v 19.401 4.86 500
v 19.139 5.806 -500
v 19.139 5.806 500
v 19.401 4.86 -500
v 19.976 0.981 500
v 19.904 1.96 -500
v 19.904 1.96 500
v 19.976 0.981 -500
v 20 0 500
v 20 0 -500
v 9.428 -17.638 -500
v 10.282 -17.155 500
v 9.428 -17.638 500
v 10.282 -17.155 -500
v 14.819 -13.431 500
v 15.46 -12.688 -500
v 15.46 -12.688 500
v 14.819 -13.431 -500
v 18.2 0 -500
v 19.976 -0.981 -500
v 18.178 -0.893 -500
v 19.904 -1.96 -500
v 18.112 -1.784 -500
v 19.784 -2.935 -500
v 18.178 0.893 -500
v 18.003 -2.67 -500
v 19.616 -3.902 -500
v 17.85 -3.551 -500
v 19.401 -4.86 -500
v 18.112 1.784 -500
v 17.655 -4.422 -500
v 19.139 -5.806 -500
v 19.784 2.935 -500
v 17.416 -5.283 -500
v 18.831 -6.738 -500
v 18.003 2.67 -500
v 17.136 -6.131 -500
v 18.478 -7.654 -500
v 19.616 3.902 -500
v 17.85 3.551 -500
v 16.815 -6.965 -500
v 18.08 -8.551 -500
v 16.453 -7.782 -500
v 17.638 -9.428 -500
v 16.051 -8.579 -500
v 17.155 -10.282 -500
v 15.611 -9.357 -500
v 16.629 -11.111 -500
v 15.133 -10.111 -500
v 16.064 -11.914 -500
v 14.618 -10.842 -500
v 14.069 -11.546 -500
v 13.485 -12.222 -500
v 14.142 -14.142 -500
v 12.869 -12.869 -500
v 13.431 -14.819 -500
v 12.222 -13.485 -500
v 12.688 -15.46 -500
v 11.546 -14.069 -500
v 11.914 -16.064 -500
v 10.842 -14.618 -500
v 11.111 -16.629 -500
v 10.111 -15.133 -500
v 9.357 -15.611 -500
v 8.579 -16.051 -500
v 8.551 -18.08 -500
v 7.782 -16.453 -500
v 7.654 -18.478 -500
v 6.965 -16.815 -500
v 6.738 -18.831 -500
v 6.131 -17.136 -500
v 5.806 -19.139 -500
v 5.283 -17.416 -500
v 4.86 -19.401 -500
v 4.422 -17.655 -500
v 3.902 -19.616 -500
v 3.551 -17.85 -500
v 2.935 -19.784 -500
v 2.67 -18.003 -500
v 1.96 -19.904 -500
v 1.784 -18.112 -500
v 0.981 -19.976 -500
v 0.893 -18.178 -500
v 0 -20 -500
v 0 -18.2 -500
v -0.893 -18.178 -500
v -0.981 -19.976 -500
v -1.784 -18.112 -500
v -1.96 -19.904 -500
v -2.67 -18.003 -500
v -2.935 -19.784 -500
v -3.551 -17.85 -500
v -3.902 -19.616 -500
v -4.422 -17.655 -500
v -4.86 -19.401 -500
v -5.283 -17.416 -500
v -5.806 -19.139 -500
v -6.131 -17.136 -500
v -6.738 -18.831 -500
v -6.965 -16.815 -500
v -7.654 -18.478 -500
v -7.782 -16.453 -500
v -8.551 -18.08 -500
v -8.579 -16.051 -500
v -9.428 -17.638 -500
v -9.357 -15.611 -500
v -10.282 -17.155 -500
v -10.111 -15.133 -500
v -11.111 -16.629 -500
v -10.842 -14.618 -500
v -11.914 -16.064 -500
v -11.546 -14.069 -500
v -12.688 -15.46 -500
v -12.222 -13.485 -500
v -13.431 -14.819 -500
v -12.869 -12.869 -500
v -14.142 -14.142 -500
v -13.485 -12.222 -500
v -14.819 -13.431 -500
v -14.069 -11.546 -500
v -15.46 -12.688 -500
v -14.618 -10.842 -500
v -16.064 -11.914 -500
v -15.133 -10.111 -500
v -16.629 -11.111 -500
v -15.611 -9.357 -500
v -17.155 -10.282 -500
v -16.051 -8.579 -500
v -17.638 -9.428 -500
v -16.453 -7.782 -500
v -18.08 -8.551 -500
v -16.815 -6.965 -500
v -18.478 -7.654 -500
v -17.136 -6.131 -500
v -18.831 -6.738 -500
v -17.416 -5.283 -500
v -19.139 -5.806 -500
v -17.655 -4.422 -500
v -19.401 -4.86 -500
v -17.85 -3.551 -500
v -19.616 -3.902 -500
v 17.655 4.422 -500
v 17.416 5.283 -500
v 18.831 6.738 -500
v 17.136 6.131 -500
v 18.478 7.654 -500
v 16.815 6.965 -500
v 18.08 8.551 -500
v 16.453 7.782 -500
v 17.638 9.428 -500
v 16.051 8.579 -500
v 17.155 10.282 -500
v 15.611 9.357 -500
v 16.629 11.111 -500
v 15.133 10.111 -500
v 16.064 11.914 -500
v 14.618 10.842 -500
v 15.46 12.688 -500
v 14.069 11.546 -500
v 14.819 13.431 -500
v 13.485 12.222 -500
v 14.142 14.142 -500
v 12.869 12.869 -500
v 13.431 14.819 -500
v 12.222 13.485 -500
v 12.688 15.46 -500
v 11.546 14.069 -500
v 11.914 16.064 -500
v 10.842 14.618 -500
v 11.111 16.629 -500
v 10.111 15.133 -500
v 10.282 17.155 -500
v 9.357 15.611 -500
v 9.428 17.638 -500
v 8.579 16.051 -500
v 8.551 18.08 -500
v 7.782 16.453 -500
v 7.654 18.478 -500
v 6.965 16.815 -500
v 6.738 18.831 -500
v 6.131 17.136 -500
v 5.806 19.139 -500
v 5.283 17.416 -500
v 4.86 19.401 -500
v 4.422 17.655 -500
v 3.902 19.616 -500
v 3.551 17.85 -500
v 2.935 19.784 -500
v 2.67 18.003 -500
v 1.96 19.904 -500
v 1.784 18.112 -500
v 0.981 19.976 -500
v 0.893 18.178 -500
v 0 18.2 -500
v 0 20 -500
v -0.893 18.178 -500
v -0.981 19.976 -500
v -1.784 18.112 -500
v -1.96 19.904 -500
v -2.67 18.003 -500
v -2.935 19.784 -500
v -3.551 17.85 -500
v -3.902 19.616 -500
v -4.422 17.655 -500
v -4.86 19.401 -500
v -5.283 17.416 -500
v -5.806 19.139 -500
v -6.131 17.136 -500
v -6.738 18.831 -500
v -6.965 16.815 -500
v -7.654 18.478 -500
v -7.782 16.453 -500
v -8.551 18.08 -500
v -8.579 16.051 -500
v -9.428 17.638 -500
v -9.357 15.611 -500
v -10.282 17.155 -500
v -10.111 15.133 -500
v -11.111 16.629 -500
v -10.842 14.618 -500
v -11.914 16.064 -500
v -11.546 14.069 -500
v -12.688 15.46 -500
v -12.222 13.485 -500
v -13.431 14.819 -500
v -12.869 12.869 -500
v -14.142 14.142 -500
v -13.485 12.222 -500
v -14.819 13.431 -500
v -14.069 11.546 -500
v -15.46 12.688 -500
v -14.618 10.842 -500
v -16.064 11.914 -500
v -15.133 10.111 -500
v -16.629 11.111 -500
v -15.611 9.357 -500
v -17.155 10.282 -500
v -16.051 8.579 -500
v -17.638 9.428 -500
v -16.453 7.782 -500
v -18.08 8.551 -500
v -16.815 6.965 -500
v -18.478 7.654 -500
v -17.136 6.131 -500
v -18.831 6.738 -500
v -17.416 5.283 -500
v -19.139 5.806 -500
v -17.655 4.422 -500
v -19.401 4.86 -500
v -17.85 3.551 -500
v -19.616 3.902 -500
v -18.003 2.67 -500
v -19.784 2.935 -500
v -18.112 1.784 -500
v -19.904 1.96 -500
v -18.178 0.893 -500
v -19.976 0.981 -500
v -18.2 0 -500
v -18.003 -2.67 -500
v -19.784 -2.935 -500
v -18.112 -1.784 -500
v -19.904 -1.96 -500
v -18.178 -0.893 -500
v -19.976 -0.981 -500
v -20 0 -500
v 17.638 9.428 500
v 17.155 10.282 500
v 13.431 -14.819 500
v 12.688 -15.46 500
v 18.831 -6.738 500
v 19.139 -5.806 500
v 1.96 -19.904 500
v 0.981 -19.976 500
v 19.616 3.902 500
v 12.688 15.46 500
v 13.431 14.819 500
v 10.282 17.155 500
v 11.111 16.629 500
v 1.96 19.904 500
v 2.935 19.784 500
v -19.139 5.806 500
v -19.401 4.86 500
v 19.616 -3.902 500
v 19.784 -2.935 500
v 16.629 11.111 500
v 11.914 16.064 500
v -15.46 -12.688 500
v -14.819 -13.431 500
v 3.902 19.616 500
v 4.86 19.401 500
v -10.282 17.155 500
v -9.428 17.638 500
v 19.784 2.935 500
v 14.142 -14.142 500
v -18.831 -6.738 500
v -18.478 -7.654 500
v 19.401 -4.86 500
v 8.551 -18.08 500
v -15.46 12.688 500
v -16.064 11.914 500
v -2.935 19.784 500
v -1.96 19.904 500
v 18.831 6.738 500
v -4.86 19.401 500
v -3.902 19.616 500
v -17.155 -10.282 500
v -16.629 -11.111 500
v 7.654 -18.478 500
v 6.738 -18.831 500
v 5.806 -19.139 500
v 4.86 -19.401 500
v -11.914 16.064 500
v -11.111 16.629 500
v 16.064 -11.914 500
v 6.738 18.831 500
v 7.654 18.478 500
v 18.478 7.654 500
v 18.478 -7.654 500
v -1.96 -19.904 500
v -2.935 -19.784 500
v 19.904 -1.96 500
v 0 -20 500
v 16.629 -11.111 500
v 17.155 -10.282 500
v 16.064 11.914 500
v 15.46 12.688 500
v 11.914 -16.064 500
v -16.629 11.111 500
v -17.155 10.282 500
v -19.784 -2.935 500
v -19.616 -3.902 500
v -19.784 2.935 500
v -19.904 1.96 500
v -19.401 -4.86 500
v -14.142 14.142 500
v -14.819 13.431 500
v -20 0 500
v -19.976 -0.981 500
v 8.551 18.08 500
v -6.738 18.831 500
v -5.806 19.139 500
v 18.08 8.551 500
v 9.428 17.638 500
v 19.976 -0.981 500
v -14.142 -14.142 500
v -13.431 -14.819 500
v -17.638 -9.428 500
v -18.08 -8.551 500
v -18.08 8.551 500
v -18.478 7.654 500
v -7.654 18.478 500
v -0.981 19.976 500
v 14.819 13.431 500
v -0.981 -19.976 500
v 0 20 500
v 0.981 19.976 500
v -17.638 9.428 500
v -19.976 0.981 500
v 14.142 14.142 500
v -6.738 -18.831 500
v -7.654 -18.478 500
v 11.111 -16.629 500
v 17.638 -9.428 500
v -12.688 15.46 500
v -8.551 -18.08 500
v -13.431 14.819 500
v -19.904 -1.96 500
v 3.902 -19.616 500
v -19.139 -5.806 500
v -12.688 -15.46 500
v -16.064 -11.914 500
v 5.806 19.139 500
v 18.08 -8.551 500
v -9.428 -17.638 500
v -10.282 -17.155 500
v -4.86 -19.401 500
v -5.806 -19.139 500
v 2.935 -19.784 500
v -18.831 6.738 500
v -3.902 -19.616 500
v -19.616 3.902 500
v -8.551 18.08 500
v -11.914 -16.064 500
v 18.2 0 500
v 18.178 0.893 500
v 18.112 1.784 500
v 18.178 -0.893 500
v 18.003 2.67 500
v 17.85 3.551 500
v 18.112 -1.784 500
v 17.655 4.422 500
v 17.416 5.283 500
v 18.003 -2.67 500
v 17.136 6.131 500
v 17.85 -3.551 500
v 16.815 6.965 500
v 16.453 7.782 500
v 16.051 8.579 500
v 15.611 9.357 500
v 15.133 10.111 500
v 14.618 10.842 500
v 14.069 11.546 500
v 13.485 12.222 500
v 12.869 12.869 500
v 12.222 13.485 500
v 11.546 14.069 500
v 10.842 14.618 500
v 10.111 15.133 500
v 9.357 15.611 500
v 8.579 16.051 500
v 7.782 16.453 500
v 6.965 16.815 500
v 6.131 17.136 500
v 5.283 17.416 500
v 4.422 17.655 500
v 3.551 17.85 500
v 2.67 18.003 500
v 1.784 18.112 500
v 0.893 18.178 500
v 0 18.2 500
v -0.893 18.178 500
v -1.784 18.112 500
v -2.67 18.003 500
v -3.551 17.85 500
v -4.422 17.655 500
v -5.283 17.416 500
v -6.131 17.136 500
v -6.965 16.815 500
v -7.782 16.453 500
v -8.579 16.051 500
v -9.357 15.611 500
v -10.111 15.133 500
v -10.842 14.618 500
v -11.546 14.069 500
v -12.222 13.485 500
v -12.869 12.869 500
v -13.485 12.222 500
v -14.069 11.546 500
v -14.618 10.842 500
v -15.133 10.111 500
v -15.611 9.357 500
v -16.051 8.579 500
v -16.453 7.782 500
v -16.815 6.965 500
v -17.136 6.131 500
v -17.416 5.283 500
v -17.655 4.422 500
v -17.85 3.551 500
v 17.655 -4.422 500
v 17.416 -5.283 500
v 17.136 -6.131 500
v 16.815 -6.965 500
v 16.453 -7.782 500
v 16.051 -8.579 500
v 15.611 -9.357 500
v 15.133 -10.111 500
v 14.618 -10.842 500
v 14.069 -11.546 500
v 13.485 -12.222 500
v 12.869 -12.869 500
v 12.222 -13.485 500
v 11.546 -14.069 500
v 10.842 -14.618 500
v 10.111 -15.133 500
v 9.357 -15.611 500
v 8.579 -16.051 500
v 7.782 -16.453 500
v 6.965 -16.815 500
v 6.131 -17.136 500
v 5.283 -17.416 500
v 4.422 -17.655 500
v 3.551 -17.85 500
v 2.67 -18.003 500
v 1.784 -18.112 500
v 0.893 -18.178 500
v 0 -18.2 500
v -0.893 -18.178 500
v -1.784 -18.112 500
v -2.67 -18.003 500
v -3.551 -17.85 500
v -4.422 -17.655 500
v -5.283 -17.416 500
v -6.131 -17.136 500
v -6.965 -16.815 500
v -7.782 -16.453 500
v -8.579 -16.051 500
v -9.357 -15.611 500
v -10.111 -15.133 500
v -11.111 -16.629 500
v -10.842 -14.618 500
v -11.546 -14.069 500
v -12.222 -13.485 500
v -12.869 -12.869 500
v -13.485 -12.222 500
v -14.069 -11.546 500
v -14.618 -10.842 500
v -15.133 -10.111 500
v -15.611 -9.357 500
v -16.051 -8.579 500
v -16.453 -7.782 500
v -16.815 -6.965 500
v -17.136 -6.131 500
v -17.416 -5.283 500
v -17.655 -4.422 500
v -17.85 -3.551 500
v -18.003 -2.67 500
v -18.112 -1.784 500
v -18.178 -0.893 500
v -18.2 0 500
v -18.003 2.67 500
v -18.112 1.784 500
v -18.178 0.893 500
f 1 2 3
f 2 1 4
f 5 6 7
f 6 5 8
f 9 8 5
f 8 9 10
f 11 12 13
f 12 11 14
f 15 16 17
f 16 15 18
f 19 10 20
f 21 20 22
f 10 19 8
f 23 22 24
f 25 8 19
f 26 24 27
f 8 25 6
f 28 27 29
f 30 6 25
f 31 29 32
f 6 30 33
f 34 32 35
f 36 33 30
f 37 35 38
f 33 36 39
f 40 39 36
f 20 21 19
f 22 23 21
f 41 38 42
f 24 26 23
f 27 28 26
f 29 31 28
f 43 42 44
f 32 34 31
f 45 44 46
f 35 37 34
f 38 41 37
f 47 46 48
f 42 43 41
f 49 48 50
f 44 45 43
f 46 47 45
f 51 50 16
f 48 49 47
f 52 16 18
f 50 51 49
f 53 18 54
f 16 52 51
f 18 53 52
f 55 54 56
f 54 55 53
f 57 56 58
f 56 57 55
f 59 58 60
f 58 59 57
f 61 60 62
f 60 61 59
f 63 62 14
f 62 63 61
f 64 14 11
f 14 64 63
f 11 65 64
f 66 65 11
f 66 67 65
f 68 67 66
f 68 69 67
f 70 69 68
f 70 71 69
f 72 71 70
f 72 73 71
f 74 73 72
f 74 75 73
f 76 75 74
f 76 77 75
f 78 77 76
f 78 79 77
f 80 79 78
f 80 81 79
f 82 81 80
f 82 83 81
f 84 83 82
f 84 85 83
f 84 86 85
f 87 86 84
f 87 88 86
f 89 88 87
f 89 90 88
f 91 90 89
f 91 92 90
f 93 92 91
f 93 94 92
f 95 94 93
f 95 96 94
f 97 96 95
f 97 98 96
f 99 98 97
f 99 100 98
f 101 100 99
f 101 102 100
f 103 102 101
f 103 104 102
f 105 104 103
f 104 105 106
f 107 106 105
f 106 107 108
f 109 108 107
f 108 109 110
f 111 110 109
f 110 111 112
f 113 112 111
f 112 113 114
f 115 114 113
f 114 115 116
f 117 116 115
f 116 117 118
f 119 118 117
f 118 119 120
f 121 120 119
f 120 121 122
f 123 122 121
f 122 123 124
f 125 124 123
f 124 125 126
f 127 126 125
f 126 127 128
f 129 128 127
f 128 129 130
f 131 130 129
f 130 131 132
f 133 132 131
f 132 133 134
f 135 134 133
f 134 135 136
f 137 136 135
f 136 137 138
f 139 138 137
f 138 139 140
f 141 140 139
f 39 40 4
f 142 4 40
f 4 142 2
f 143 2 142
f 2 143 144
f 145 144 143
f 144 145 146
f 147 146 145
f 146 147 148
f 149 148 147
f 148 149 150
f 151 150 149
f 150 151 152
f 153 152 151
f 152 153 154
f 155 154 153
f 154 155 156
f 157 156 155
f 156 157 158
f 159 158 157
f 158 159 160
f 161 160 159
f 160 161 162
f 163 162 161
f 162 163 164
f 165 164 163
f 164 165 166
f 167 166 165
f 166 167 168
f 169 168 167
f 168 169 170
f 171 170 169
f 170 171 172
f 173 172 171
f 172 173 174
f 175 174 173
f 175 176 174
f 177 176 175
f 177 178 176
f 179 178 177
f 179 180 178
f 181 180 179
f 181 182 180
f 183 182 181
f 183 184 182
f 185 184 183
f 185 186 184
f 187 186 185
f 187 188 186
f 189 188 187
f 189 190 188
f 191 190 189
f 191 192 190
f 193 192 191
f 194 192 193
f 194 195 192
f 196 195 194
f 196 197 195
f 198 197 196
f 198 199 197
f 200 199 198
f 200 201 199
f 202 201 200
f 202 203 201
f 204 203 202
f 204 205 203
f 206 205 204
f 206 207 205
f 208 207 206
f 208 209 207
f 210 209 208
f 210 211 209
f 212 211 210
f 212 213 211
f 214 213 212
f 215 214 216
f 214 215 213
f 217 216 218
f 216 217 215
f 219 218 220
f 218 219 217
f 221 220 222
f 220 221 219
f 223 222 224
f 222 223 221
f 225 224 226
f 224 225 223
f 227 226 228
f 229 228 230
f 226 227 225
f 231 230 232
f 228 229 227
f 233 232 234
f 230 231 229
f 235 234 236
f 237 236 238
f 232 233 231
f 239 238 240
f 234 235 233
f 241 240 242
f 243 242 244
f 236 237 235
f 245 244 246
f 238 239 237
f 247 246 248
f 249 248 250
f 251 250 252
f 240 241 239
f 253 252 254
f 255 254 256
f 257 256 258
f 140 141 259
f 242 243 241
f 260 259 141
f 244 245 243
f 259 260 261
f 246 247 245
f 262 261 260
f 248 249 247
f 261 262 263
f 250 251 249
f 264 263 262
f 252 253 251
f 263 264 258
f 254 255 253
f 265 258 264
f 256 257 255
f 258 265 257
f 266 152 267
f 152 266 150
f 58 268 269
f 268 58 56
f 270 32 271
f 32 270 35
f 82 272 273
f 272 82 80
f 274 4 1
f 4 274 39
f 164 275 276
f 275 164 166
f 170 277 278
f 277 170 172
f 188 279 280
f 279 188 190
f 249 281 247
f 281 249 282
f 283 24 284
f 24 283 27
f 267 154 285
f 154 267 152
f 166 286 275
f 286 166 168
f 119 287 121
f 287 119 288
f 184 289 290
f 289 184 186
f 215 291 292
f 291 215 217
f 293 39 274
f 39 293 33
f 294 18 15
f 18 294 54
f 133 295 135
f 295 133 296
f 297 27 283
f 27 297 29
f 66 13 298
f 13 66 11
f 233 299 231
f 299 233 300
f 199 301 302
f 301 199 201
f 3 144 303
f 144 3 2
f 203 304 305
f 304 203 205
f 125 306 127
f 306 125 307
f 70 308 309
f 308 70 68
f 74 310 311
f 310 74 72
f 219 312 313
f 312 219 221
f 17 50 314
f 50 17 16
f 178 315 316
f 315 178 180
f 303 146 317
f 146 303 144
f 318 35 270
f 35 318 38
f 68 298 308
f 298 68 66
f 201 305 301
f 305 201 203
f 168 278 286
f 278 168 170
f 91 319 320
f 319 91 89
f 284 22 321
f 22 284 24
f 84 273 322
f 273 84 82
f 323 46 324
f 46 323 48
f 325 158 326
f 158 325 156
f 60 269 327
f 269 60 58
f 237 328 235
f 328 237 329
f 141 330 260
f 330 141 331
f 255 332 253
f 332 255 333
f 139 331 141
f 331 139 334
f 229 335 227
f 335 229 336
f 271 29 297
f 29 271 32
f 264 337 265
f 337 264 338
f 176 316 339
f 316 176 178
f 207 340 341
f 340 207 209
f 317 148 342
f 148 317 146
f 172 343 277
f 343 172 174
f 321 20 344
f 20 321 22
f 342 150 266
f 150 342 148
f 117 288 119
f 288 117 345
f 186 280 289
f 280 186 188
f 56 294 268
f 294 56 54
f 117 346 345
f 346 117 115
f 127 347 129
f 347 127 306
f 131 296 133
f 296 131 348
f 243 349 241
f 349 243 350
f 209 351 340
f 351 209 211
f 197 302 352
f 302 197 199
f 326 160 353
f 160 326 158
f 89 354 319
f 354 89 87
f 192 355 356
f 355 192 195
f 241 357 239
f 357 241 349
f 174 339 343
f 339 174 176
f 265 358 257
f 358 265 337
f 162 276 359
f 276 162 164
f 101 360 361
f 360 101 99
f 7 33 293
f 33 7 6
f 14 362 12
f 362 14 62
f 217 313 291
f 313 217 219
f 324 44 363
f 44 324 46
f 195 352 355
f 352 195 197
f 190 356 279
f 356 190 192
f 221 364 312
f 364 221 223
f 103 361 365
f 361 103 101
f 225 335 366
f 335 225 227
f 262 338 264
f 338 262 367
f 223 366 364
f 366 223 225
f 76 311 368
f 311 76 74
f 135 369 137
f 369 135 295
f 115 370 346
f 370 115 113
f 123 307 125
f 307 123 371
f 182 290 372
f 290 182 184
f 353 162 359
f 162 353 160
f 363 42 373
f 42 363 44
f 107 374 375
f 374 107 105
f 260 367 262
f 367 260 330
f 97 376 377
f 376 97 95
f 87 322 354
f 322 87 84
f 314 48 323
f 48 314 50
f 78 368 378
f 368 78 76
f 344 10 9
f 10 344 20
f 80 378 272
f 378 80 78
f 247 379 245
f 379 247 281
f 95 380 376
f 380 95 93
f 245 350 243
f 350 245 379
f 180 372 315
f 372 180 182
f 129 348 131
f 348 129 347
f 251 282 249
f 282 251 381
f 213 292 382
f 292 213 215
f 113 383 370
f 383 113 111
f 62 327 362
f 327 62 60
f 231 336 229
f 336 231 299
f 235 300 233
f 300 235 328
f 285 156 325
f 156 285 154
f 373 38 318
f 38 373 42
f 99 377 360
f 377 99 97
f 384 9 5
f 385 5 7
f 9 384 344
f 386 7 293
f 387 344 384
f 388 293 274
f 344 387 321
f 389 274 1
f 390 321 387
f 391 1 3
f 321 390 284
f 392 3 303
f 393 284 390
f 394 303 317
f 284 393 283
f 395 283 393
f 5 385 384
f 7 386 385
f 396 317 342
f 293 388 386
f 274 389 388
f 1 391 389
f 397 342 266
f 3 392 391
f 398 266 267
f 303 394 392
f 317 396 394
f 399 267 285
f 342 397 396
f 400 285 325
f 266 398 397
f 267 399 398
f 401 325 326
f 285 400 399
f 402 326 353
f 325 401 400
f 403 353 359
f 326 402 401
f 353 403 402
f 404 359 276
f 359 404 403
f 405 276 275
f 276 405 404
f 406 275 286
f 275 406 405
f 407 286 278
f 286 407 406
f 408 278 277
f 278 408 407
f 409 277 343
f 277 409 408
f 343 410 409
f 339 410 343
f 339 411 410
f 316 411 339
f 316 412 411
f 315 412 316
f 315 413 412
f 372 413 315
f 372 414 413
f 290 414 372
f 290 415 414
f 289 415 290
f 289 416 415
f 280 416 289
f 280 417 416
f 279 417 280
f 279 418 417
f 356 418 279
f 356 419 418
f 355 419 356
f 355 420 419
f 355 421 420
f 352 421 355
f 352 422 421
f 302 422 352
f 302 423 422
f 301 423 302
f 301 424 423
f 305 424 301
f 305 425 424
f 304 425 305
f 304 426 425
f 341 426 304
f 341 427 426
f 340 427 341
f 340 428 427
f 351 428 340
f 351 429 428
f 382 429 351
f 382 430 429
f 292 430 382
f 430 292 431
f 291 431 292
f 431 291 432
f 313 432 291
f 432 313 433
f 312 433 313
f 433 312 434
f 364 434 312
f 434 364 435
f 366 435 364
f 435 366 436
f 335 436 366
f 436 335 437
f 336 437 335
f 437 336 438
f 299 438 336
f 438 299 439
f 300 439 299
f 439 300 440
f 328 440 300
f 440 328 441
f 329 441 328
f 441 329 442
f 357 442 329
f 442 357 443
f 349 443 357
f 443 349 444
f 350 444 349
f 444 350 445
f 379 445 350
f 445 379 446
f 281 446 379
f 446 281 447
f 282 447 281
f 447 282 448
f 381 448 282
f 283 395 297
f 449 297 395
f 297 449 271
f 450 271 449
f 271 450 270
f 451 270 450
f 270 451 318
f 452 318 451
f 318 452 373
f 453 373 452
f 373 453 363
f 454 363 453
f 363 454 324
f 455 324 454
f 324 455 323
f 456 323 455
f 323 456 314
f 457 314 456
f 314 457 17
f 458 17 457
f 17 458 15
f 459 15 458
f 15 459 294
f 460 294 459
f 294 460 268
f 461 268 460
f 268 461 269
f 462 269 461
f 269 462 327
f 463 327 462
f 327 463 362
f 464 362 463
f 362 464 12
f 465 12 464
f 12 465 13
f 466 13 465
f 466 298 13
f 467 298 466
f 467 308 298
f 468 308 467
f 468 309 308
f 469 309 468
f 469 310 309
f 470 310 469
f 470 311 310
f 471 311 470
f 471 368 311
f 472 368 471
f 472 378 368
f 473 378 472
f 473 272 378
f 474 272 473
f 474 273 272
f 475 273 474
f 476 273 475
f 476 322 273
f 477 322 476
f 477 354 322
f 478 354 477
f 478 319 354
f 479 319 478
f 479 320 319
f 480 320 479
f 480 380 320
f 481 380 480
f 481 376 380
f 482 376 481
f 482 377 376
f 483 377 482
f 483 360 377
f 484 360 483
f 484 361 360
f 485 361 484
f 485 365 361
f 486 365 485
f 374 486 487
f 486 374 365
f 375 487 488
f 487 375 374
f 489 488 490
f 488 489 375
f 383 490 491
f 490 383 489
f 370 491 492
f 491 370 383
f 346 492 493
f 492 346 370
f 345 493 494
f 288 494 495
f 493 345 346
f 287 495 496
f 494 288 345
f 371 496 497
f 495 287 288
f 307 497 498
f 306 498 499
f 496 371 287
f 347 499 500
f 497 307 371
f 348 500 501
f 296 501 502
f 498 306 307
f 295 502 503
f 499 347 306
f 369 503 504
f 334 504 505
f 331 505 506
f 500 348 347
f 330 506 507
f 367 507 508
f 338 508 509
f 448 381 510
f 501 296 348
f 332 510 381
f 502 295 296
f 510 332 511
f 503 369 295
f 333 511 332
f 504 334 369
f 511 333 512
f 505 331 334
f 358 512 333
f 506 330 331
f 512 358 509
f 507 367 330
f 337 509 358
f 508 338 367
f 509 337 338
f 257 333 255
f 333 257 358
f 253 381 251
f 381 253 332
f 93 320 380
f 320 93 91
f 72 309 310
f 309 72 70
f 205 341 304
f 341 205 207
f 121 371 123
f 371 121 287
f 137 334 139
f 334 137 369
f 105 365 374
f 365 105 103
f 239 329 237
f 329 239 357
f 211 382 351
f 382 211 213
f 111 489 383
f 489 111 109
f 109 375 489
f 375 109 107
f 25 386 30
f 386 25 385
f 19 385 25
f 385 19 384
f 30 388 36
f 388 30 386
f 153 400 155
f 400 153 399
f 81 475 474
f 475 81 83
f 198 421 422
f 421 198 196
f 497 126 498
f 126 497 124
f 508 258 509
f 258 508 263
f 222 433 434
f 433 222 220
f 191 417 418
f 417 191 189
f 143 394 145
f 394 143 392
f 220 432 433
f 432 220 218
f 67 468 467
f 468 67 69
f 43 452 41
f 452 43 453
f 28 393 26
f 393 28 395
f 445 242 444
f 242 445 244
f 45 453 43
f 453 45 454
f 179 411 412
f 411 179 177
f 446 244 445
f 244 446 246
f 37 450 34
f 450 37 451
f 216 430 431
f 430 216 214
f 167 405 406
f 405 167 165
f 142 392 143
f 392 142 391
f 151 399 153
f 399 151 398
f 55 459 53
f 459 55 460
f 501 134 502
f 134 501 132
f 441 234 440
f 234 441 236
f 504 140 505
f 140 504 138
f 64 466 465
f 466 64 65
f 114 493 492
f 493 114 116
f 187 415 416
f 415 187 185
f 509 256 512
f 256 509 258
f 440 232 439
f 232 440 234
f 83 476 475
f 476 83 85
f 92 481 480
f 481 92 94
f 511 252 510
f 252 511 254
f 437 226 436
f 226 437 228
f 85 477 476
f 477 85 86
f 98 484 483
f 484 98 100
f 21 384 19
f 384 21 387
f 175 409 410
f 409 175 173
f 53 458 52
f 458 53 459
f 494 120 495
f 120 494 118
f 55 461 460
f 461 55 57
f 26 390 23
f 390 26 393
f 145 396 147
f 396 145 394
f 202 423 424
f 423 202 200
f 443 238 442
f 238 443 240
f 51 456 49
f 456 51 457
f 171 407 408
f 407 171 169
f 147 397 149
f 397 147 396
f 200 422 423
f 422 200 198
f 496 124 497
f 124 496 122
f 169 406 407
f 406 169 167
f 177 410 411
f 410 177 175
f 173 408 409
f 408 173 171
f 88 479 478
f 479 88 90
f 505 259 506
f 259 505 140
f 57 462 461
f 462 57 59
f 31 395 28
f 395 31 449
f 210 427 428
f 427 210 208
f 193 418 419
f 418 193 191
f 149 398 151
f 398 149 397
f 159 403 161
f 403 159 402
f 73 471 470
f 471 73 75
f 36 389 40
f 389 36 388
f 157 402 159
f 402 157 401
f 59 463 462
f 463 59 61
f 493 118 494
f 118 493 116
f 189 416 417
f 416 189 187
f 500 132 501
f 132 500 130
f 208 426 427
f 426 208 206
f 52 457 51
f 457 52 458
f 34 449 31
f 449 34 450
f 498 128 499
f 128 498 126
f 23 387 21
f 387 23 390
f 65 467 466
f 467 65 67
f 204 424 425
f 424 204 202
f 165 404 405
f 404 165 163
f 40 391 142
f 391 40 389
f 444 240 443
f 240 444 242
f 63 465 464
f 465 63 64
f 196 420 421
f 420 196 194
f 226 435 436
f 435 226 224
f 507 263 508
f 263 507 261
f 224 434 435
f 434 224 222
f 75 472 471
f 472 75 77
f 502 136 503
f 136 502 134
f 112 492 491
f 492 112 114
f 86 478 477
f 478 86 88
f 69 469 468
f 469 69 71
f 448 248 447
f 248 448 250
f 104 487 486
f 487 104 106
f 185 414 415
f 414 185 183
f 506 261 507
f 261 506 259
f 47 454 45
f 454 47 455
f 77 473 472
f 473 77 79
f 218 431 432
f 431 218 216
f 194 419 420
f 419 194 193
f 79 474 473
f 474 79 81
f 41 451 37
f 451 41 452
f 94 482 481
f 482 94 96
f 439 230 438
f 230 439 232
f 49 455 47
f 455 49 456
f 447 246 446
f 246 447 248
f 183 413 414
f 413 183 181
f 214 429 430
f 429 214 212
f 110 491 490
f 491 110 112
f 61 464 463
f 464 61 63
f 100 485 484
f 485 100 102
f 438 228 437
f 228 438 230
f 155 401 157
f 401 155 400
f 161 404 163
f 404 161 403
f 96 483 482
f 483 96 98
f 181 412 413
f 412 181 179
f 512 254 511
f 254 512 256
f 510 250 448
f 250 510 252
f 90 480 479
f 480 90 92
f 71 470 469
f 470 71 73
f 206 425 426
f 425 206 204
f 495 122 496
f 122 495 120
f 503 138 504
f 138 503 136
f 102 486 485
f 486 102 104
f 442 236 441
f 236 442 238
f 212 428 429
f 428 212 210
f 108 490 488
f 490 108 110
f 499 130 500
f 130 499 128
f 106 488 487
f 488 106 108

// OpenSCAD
$fn=128;

module ht_pipe(od=40, wall=1.8, length=1000) {
    difference() {
        cylinder(h=length, d=od, center=true);
        cylinder(h=length+2, d=od-2*wall, center=true);
    }
}

ht_pipe(od=40, wall=1.8, length=1000);
